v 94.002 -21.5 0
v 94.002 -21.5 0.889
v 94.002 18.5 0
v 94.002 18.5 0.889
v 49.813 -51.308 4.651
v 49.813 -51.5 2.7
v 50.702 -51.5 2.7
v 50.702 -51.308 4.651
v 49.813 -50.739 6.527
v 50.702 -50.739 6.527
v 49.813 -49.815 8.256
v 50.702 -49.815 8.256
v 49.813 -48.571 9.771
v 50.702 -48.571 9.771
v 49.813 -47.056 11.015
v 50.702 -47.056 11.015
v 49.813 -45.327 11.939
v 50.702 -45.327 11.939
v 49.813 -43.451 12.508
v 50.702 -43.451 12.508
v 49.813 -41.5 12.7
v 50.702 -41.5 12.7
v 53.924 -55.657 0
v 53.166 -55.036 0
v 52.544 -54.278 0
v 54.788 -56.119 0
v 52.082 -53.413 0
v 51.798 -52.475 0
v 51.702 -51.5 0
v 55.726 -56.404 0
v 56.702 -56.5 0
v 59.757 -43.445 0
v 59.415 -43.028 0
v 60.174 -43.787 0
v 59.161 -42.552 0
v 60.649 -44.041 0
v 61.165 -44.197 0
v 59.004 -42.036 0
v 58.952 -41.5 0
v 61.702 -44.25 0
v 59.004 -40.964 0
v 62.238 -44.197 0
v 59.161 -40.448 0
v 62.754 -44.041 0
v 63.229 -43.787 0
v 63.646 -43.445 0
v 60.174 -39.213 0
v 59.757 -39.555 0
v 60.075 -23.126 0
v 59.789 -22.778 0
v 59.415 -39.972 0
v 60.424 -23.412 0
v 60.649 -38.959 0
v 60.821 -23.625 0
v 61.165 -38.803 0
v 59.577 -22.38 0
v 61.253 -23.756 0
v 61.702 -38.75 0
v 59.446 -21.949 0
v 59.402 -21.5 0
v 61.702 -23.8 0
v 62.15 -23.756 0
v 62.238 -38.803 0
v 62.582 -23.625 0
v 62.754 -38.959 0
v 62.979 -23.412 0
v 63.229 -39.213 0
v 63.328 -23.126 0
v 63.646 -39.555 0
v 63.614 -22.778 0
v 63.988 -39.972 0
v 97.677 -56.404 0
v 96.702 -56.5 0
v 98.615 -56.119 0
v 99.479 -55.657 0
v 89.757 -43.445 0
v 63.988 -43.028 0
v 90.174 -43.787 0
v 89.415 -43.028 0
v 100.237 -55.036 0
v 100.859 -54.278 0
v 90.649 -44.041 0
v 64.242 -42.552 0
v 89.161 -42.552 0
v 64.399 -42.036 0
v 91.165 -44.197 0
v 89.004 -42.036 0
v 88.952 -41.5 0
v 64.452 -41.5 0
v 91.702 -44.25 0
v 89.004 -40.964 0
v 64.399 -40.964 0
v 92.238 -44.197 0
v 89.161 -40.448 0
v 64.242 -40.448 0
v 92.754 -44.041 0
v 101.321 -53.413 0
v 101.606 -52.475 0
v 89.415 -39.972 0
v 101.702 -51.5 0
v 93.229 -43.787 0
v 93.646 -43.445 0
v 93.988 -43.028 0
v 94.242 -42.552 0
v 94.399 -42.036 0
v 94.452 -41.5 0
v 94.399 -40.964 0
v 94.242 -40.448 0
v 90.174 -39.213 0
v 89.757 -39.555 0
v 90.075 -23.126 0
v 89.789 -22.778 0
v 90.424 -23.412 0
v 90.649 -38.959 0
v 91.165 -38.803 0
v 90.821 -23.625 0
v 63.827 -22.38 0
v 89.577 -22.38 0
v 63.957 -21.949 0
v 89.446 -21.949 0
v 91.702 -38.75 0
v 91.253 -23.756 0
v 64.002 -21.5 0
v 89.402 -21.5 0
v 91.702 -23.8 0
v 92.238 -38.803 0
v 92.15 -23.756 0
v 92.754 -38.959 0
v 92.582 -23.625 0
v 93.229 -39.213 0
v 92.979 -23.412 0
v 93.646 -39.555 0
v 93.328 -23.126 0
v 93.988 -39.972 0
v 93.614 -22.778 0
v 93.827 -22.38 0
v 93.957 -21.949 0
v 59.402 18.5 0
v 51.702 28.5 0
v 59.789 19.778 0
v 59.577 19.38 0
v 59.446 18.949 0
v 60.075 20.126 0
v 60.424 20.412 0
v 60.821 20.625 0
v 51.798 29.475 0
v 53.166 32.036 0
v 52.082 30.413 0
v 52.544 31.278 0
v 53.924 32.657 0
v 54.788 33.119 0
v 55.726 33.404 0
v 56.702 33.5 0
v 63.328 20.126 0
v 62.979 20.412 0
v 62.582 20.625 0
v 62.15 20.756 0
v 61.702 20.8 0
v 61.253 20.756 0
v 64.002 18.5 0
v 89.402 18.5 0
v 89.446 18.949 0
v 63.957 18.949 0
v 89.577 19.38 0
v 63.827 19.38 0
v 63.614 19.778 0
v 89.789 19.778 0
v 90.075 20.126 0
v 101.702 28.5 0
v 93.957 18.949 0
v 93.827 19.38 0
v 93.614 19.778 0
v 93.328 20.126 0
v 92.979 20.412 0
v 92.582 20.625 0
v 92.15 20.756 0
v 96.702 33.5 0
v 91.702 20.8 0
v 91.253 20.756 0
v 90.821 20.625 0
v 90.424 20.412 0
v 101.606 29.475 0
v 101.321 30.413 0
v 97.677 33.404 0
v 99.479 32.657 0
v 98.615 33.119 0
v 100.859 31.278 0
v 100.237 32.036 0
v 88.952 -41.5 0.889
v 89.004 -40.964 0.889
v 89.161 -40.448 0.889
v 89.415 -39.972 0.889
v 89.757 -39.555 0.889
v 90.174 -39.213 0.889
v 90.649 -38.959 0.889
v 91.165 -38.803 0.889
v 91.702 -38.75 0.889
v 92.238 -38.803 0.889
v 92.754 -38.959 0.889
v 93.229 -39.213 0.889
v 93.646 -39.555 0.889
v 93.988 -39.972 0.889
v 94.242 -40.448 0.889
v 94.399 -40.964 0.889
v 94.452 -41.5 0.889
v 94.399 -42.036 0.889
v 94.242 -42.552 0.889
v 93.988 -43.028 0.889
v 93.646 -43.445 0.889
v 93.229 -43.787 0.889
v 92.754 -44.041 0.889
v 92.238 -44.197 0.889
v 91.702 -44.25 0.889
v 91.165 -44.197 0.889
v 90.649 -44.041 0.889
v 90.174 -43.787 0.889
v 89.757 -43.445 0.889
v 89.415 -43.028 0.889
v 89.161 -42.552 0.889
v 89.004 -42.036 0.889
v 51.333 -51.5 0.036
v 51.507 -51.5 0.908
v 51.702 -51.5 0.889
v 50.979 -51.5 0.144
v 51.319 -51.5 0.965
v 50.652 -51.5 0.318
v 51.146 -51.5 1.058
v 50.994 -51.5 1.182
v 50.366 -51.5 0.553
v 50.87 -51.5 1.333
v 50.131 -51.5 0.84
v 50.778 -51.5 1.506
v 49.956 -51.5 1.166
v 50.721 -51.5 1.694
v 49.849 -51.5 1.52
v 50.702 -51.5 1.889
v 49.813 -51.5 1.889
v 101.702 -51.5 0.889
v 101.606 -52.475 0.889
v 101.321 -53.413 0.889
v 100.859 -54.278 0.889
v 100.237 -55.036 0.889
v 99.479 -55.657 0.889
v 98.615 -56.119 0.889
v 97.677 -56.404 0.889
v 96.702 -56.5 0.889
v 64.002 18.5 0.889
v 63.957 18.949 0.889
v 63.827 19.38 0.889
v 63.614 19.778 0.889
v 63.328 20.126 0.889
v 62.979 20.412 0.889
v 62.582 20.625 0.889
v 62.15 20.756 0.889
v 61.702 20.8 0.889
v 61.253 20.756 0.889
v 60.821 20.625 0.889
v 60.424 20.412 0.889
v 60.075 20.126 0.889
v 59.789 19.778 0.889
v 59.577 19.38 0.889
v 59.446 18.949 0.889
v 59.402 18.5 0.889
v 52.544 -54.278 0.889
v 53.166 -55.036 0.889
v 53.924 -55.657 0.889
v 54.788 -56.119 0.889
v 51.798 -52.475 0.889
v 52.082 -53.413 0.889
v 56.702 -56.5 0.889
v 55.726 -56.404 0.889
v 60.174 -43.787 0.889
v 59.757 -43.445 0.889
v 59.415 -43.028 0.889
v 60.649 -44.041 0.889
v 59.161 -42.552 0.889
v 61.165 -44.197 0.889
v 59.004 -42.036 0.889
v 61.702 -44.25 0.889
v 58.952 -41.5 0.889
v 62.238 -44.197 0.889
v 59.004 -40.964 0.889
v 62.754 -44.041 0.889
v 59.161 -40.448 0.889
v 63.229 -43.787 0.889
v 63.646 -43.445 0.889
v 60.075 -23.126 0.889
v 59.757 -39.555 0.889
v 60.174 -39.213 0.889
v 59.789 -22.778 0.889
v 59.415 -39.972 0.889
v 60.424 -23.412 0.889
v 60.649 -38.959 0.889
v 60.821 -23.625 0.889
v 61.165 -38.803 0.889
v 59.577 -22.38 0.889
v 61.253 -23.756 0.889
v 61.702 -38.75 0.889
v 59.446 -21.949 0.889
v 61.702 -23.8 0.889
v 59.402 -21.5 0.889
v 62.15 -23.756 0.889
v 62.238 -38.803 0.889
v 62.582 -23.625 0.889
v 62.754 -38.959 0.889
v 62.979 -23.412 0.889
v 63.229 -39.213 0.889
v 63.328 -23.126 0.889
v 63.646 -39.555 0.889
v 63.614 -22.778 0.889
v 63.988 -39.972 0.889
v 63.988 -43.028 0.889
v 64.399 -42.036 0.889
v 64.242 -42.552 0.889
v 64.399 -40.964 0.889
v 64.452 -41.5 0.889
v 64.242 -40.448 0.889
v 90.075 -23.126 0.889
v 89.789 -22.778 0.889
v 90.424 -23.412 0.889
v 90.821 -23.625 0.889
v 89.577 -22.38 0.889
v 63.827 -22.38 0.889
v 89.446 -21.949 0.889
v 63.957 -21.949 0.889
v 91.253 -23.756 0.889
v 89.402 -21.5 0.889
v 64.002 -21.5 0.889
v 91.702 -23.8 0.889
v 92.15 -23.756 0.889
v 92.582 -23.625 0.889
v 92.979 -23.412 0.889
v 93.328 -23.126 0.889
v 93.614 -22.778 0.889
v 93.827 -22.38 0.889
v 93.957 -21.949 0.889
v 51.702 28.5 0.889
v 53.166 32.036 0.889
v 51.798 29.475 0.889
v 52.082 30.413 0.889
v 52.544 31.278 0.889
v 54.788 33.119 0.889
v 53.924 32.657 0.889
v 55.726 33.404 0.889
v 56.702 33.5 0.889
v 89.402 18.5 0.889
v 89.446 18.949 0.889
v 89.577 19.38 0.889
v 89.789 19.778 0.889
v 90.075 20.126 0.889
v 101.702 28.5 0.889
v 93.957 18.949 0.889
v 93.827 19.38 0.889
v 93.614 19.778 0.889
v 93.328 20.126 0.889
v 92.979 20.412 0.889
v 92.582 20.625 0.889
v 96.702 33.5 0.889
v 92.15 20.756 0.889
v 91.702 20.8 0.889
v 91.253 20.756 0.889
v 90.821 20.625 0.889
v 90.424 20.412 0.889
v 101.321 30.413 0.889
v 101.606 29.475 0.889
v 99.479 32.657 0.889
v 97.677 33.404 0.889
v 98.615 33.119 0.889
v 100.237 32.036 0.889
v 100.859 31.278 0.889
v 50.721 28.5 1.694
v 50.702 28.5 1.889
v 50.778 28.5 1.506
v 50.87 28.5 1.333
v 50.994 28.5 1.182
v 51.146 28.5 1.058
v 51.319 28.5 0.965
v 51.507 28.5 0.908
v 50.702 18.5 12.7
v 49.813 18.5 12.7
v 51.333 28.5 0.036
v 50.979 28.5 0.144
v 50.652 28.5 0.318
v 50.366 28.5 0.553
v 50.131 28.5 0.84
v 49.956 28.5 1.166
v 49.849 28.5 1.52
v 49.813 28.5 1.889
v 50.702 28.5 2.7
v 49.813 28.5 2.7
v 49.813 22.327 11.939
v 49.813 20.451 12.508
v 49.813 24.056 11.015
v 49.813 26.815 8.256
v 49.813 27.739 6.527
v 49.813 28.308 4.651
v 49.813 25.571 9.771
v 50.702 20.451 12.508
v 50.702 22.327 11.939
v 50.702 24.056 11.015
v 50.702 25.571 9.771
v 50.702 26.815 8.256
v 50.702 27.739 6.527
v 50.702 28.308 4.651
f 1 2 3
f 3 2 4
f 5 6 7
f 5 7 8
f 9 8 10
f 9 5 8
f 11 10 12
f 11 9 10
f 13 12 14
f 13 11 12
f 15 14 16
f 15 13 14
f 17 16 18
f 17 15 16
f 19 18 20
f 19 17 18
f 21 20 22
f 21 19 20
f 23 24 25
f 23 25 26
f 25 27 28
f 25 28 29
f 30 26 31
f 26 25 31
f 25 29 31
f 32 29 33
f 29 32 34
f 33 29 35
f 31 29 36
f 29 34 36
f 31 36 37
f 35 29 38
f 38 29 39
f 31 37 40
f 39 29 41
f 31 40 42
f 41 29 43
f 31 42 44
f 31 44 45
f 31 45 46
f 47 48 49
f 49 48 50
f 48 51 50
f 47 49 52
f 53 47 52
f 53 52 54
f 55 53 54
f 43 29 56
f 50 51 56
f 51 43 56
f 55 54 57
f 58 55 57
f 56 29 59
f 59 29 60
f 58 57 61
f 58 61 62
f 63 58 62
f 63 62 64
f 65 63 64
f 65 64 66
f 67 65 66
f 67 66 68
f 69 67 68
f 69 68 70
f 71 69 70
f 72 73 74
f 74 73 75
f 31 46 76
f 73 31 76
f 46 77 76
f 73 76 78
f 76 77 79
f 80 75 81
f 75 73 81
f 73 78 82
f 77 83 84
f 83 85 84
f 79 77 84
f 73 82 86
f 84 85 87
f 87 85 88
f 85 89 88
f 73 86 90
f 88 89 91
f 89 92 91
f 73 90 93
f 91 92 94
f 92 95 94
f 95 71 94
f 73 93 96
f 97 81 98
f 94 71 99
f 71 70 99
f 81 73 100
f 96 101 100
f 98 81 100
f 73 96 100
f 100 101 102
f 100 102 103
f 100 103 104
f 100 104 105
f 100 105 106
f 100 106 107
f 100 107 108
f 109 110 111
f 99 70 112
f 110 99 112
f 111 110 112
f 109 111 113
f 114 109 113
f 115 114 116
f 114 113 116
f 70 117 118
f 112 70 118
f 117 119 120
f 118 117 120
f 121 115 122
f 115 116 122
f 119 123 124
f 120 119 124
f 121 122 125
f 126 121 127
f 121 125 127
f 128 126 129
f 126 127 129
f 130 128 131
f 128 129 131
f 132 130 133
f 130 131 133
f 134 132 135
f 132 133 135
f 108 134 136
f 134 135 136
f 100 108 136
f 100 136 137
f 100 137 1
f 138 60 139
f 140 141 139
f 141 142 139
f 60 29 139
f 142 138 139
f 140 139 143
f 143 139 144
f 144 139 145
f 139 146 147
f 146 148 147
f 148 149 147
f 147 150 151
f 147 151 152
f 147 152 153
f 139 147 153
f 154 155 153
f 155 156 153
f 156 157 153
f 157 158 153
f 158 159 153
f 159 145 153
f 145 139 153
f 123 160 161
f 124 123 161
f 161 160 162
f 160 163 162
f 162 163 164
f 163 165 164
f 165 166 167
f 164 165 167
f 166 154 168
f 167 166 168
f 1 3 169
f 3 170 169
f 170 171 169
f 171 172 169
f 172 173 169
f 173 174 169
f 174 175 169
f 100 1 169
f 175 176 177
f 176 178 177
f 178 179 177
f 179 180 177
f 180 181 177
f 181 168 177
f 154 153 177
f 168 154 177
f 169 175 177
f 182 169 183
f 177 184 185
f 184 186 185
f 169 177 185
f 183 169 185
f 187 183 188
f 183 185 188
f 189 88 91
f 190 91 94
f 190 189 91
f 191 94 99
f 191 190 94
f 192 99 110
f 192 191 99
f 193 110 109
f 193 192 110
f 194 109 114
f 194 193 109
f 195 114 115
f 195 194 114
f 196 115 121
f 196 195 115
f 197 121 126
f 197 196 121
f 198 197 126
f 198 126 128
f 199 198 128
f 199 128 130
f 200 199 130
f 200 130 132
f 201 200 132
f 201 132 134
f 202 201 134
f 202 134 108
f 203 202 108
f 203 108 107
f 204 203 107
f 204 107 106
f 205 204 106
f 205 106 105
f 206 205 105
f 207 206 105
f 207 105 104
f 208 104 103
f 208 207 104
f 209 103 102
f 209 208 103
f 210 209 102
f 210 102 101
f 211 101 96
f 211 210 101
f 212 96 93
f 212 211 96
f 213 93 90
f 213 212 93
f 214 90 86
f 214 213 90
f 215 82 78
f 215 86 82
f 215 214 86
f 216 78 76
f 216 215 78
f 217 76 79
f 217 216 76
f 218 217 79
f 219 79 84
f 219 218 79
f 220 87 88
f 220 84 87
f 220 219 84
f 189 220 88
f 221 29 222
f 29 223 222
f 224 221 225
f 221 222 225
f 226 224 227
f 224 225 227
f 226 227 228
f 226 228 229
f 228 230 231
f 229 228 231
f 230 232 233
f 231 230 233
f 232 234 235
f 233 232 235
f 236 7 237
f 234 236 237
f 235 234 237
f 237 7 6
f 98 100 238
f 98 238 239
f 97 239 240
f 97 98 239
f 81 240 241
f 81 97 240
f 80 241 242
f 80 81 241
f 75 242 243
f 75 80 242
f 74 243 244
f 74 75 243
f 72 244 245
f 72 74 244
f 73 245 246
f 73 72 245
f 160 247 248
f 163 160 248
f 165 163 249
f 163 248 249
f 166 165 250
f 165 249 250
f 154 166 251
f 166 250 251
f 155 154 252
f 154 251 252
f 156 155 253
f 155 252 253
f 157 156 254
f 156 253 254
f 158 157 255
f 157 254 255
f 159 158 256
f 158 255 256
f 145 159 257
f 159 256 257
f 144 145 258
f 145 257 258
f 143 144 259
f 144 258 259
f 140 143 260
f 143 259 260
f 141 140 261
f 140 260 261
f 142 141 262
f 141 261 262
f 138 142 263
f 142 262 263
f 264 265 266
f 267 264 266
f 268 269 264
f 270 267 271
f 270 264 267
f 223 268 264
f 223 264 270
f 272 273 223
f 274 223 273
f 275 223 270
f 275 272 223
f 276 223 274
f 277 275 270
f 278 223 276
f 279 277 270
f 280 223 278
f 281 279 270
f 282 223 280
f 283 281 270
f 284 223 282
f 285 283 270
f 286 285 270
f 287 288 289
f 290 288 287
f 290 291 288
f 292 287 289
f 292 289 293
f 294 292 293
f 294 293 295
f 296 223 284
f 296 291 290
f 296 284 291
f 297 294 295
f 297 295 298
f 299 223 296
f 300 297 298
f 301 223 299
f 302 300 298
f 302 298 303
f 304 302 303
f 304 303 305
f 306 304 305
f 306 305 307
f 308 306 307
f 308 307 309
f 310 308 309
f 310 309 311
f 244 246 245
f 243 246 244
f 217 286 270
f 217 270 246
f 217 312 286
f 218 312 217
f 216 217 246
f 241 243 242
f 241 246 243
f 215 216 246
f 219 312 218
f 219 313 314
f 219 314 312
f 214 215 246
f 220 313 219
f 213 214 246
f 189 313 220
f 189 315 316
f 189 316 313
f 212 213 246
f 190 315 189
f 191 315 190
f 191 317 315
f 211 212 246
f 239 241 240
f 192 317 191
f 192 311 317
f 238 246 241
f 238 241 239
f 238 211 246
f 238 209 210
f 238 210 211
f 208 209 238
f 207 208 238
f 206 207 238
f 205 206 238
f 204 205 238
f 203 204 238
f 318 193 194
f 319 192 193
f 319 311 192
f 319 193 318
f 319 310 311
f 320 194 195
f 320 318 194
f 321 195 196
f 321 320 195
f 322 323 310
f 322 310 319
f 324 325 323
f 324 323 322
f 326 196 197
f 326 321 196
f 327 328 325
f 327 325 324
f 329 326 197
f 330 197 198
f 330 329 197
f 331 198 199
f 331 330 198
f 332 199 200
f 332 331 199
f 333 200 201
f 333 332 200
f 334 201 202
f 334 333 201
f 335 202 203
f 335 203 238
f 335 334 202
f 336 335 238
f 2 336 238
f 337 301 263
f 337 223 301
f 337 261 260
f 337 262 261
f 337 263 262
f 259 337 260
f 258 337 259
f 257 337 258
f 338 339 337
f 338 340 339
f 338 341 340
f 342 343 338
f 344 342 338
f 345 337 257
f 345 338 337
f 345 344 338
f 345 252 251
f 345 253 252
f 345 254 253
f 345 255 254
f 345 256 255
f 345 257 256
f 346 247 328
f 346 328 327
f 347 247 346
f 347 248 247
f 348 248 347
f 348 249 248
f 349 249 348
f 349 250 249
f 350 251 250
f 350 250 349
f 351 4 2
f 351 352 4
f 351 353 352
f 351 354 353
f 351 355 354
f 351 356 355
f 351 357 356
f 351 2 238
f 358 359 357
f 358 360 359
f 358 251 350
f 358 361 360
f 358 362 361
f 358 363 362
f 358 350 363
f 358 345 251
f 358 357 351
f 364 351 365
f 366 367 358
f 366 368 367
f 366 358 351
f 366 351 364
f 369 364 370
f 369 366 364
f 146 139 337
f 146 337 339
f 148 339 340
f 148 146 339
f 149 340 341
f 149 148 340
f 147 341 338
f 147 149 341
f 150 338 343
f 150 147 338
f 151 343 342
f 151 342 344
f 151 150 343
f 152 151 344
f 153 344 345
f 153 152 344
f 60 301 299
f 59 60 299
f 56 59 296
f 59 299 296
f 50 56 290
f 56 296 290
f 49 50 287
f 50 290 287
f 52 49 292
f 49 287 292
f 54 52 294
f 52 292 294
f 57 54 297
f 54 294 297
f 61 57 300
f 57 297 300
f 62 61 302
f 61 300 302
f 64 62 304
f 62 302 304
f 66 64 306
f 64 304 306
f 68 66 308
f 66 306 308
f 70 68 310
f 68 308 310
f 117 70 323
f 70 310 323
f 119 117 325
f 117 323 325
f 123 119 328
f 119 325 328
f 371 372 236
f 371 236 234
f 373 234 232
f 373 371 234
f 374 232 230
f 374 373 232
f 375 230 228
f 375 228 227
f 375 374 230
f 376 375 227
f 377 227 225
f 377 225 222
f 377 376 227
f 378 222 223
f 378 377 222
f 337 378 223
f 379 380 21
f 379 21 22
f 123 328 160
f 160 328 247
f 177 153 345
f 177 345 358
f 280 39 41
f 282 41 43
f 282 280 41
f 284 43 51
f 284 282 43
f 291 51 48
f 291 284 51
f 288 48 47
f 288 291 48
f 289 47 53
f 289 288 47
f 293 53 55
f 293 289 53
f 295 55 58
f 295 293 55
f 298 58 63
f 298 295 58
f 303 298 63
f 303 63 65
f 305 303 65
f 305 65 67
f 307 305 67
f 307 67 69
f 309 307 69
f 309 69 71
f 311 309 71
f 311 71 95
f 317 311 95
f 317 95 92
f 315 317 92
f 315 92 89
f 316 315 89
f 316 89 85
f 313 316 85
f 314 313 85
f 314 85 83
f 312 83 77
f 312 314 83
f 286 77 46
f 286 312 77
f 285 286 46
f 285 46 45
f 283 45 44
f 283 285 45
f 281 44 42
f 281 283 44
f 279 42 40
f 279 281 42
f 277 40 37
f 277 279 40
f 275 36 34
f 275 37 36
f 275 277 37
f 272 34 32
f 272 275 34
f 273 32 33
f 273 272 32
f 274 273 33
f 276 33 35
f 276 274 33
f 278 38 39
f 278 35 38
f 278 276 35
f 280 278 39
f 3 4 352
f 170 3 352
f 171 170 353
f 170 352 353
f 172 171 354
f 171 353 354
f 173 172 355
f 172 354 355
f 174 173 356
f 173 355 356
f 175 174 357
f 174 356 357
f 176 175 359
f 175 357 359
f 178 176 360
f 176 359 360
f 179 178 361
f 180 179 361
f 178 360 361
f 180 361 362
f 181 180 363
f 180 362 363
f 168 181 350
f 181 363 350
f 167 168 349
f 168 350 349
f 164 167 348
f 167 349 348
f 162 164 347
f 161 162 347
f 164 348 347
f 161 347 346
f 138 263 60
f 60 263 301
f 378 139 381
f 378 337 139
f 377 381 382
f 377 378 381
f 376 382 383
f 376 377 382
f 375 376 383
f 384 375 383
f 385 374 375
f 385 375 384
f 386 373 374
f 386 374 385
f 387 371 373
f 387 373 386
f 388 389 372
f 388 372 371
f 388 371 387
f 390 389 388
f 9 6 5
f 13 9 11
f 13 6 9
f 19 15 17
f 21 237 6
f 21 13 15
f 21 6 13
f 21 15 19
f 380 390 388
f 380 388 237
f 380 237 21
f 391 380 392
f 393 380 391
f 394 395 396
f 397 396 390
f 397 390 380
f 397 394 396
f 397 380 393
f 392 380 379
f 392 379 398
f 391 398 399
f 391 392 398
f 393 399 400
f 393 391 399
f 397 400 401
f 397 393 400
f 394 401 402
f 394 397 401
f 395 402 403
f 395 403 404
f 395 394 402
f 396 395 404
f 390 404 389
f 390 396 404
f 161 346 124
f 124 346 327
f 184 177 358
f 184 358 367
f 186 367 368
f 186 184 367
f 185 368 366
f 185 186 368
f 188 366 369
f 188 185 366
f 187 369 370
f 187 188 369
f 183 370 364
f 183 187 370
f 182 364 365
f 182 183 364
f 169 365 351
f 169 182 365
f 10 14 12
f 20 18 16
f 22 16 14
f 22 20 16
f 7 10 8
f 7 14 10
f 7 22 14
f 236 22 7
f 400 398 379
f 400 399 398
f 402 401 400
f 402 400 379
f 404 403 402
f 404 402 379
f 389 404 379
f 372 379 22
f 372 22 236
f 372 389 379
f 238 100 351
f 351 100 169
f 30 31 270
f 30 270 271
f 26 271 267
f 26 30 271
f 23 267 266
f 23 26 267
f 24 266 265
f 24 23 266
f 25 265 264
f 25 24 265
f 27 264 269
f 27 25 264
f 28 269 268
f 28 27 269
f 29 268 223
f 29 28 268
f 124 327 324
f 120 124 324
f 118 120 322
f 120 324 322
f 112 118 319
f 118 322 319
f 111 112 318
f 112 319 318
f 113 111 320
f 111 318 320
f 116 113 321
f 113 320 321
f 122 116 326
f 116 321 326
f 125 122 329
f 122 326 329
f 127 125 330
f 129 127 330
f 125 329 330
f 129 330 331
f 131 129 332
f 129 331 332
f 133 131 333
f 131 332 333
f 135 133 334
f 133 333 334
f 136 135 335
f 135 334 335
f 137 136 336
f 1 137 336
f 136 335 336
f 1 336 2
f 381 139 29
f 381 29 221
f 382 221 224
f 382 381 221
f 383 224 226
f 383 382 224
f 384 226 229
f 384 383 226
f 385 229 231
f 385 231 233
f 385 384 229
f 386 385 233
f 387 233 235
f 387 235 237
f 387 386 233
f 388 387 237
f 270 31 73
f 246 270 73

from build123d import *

# Parameters (mm, degrees)
SKETCH1_W           = 50
SKETCH1_H           = 90
BOSS_EXTRUDE1_DEPTH = 0.889
SKETCH2_R           = 2.75
CUT_EXTRUDE1_DEPTH  = 117.345408204
BREAK_CORNER1_DEPTH = 0.889
EDGE_FLANGE1_DEPTH  = 80
BREAK_CORNER2_START = 49.812591379
BREAK_CORNER2_DEPTH = 0.889


# Read off the part's stored shape, not the designer's step: Break-Corner1, Break-Corner2
# Sheet-metal steps are written as plain solids
with BuildPart() as part:
    # Sketch1 → Boss-Extrude1 (new body)
    with BuildSketch(Plane.XY):
        with Locations((76.701591379, -11.5)):
            Rectangle(SKETCH1_W, SKETCH1_H)
    extrude(amount=BOSS_EXTRUDE1_DEPTH)

    # Sketch2 → Cut-Extrude1 (cut, through all)
    with BuildSketch(Plane(origin=(0, 0, 0.889), x_dir=(-1, 0, 0), z_dir=(0, 0, -1))):
        with Locations((-61.701591379, -41.5)):
            Circle(SKETCH2_R)
        with Locations((-91.701591379, -41.5)):
            Circle(SKETCH2_R)
        with BuildLine():
            Line((-64.001591379, -21.5), (-64.001591379, 18.5))
            ThreePointArc((-64.001591379, 18.5), (-61.701591379, 20.8), (-59.401591379, 18.5))
            Line((-59.401591379, 18.5), (-59.401591379, -21.5))
            ThreePointArc((-59.401591379, -21.5), (-61.701591379, -23.8), (-64.001591379, -21.5))
        make_face()
        with BuildLine():
            Line((-94.001591379, -21.5), (-94.001591379, 18.5))
            ThreePointArc((-94.001591379, 18.5), (-91.701591379, 20.8), (-89.401591379, 18.5))
            Line((-89.401591379, 18.5), (-89.401591379, -21.5))
            ThreePointArc((-89.401591379, -21.5), (-91.701591379, -23.8), (-94.001591379, -21.5))
        make_face()
    extrude(amount=CUT_EXTRUDE1_DEPTH, mode=Mode.SUBTRACT)

    # Break-Corner1 outline → Break-Corner1 (cut)
    with BuildSketch(Plane.XY):
        with BuildLine():
            ThreePointArc((51.701591379, 28.5), (53.166057473, 32.035533906), (56.701591379, 33.5))
            Line((56.701591379, 33.5), (51.701591379, 33.5))
            Line((51.701591379, 33.5), (51.701591379, 28.5))
        make_face()
        with BuildLine():
            Line((101.701591379, 33.5), (96.701591379, 33.5))
            ThreePointArc((96.701591379, 33.5), (100.237125285, 32.035533906), (101.701591379, 28.5))
            Line((101.701591379, 28.5), (101.701591379, 33.5))
        make_face()
        with BuildLine():
            ThreePointArc((56.701591379, -56.5), (53.166057474, -55.035533906), (51.701591379, -51.5))
            Line((51.701591379, -51.5), (51.701591379, -56.5))
            Line((51.701591379, -56.5), (56.701591379, -56.5))
        make_face()
        with BuildLine():
            Line((101.701591379, -56.5), (101.701591379, -51.5))
            ThreePointArc((101.701591379, -51.5), (100.237125285, -55.035533906), (96.701591379, -56.5))
            Line((96.701591379, -56.5), (101.701591379, -56.5))
        make_face()
    extrude(amount=BREAK_CORNER1_DEPTH, mode=Mode.SUBTRACT)

    # Edge-Flange1 section (across the edge) → Edge-Flange1 (add)
    with BuildSketch(Plane(origin=(50.701591379, 28.5, 0.889), x_dir=(1, 0, 0), z_dir=(0, -1, 0))):
        with BuildLine():
            Line((-0.889, 1), (-0.889, 11.811))
            Line((-0.889, 11.811), (0, 11.811))
            Line((0, 11.811), (0, 1))
            ThreePointArc((0, 1), (0.292893219, 0.292893219), (1, 0))
            Line((1, 0), (1, -0.889))
            ThreePointArc((1, -0.889), (-0.33572471, -0.33572471), (-0.889, 1))
        make_face()
    extrude(amount=EDGE_FLANGE1_DEPTH)

    # Break-Corner2 outline → Break-Corner2 (cut)
    with BuildSketch(Plane.YZ.offset(BREAK_CORNER2_START)):
        with BuildLine():
            ThreePointArc((-51.5, 2.7), (-48.571067812, 9.771067812), (-41.5, 12.7))
            Line((-41.5, 12.7), (-51.5, 12.7))
            Line((-51.5, 12.7), (-51.5, 2.7))
        make_face()
        with BuildLine():
            Line((28.5, 12.7), (18.5, 12.7))
            ThreePointArc((18.5, 12.7), (25.571067812, 9.771067812), (28.5, 2.7))
            Line((28.5, 2.7), (28.5, 12.7))
        make_face()
    extrude(amount=BREAK_CORNER2_DEPTH, mode=Mode.SUBTRACT)


solid = part.part
